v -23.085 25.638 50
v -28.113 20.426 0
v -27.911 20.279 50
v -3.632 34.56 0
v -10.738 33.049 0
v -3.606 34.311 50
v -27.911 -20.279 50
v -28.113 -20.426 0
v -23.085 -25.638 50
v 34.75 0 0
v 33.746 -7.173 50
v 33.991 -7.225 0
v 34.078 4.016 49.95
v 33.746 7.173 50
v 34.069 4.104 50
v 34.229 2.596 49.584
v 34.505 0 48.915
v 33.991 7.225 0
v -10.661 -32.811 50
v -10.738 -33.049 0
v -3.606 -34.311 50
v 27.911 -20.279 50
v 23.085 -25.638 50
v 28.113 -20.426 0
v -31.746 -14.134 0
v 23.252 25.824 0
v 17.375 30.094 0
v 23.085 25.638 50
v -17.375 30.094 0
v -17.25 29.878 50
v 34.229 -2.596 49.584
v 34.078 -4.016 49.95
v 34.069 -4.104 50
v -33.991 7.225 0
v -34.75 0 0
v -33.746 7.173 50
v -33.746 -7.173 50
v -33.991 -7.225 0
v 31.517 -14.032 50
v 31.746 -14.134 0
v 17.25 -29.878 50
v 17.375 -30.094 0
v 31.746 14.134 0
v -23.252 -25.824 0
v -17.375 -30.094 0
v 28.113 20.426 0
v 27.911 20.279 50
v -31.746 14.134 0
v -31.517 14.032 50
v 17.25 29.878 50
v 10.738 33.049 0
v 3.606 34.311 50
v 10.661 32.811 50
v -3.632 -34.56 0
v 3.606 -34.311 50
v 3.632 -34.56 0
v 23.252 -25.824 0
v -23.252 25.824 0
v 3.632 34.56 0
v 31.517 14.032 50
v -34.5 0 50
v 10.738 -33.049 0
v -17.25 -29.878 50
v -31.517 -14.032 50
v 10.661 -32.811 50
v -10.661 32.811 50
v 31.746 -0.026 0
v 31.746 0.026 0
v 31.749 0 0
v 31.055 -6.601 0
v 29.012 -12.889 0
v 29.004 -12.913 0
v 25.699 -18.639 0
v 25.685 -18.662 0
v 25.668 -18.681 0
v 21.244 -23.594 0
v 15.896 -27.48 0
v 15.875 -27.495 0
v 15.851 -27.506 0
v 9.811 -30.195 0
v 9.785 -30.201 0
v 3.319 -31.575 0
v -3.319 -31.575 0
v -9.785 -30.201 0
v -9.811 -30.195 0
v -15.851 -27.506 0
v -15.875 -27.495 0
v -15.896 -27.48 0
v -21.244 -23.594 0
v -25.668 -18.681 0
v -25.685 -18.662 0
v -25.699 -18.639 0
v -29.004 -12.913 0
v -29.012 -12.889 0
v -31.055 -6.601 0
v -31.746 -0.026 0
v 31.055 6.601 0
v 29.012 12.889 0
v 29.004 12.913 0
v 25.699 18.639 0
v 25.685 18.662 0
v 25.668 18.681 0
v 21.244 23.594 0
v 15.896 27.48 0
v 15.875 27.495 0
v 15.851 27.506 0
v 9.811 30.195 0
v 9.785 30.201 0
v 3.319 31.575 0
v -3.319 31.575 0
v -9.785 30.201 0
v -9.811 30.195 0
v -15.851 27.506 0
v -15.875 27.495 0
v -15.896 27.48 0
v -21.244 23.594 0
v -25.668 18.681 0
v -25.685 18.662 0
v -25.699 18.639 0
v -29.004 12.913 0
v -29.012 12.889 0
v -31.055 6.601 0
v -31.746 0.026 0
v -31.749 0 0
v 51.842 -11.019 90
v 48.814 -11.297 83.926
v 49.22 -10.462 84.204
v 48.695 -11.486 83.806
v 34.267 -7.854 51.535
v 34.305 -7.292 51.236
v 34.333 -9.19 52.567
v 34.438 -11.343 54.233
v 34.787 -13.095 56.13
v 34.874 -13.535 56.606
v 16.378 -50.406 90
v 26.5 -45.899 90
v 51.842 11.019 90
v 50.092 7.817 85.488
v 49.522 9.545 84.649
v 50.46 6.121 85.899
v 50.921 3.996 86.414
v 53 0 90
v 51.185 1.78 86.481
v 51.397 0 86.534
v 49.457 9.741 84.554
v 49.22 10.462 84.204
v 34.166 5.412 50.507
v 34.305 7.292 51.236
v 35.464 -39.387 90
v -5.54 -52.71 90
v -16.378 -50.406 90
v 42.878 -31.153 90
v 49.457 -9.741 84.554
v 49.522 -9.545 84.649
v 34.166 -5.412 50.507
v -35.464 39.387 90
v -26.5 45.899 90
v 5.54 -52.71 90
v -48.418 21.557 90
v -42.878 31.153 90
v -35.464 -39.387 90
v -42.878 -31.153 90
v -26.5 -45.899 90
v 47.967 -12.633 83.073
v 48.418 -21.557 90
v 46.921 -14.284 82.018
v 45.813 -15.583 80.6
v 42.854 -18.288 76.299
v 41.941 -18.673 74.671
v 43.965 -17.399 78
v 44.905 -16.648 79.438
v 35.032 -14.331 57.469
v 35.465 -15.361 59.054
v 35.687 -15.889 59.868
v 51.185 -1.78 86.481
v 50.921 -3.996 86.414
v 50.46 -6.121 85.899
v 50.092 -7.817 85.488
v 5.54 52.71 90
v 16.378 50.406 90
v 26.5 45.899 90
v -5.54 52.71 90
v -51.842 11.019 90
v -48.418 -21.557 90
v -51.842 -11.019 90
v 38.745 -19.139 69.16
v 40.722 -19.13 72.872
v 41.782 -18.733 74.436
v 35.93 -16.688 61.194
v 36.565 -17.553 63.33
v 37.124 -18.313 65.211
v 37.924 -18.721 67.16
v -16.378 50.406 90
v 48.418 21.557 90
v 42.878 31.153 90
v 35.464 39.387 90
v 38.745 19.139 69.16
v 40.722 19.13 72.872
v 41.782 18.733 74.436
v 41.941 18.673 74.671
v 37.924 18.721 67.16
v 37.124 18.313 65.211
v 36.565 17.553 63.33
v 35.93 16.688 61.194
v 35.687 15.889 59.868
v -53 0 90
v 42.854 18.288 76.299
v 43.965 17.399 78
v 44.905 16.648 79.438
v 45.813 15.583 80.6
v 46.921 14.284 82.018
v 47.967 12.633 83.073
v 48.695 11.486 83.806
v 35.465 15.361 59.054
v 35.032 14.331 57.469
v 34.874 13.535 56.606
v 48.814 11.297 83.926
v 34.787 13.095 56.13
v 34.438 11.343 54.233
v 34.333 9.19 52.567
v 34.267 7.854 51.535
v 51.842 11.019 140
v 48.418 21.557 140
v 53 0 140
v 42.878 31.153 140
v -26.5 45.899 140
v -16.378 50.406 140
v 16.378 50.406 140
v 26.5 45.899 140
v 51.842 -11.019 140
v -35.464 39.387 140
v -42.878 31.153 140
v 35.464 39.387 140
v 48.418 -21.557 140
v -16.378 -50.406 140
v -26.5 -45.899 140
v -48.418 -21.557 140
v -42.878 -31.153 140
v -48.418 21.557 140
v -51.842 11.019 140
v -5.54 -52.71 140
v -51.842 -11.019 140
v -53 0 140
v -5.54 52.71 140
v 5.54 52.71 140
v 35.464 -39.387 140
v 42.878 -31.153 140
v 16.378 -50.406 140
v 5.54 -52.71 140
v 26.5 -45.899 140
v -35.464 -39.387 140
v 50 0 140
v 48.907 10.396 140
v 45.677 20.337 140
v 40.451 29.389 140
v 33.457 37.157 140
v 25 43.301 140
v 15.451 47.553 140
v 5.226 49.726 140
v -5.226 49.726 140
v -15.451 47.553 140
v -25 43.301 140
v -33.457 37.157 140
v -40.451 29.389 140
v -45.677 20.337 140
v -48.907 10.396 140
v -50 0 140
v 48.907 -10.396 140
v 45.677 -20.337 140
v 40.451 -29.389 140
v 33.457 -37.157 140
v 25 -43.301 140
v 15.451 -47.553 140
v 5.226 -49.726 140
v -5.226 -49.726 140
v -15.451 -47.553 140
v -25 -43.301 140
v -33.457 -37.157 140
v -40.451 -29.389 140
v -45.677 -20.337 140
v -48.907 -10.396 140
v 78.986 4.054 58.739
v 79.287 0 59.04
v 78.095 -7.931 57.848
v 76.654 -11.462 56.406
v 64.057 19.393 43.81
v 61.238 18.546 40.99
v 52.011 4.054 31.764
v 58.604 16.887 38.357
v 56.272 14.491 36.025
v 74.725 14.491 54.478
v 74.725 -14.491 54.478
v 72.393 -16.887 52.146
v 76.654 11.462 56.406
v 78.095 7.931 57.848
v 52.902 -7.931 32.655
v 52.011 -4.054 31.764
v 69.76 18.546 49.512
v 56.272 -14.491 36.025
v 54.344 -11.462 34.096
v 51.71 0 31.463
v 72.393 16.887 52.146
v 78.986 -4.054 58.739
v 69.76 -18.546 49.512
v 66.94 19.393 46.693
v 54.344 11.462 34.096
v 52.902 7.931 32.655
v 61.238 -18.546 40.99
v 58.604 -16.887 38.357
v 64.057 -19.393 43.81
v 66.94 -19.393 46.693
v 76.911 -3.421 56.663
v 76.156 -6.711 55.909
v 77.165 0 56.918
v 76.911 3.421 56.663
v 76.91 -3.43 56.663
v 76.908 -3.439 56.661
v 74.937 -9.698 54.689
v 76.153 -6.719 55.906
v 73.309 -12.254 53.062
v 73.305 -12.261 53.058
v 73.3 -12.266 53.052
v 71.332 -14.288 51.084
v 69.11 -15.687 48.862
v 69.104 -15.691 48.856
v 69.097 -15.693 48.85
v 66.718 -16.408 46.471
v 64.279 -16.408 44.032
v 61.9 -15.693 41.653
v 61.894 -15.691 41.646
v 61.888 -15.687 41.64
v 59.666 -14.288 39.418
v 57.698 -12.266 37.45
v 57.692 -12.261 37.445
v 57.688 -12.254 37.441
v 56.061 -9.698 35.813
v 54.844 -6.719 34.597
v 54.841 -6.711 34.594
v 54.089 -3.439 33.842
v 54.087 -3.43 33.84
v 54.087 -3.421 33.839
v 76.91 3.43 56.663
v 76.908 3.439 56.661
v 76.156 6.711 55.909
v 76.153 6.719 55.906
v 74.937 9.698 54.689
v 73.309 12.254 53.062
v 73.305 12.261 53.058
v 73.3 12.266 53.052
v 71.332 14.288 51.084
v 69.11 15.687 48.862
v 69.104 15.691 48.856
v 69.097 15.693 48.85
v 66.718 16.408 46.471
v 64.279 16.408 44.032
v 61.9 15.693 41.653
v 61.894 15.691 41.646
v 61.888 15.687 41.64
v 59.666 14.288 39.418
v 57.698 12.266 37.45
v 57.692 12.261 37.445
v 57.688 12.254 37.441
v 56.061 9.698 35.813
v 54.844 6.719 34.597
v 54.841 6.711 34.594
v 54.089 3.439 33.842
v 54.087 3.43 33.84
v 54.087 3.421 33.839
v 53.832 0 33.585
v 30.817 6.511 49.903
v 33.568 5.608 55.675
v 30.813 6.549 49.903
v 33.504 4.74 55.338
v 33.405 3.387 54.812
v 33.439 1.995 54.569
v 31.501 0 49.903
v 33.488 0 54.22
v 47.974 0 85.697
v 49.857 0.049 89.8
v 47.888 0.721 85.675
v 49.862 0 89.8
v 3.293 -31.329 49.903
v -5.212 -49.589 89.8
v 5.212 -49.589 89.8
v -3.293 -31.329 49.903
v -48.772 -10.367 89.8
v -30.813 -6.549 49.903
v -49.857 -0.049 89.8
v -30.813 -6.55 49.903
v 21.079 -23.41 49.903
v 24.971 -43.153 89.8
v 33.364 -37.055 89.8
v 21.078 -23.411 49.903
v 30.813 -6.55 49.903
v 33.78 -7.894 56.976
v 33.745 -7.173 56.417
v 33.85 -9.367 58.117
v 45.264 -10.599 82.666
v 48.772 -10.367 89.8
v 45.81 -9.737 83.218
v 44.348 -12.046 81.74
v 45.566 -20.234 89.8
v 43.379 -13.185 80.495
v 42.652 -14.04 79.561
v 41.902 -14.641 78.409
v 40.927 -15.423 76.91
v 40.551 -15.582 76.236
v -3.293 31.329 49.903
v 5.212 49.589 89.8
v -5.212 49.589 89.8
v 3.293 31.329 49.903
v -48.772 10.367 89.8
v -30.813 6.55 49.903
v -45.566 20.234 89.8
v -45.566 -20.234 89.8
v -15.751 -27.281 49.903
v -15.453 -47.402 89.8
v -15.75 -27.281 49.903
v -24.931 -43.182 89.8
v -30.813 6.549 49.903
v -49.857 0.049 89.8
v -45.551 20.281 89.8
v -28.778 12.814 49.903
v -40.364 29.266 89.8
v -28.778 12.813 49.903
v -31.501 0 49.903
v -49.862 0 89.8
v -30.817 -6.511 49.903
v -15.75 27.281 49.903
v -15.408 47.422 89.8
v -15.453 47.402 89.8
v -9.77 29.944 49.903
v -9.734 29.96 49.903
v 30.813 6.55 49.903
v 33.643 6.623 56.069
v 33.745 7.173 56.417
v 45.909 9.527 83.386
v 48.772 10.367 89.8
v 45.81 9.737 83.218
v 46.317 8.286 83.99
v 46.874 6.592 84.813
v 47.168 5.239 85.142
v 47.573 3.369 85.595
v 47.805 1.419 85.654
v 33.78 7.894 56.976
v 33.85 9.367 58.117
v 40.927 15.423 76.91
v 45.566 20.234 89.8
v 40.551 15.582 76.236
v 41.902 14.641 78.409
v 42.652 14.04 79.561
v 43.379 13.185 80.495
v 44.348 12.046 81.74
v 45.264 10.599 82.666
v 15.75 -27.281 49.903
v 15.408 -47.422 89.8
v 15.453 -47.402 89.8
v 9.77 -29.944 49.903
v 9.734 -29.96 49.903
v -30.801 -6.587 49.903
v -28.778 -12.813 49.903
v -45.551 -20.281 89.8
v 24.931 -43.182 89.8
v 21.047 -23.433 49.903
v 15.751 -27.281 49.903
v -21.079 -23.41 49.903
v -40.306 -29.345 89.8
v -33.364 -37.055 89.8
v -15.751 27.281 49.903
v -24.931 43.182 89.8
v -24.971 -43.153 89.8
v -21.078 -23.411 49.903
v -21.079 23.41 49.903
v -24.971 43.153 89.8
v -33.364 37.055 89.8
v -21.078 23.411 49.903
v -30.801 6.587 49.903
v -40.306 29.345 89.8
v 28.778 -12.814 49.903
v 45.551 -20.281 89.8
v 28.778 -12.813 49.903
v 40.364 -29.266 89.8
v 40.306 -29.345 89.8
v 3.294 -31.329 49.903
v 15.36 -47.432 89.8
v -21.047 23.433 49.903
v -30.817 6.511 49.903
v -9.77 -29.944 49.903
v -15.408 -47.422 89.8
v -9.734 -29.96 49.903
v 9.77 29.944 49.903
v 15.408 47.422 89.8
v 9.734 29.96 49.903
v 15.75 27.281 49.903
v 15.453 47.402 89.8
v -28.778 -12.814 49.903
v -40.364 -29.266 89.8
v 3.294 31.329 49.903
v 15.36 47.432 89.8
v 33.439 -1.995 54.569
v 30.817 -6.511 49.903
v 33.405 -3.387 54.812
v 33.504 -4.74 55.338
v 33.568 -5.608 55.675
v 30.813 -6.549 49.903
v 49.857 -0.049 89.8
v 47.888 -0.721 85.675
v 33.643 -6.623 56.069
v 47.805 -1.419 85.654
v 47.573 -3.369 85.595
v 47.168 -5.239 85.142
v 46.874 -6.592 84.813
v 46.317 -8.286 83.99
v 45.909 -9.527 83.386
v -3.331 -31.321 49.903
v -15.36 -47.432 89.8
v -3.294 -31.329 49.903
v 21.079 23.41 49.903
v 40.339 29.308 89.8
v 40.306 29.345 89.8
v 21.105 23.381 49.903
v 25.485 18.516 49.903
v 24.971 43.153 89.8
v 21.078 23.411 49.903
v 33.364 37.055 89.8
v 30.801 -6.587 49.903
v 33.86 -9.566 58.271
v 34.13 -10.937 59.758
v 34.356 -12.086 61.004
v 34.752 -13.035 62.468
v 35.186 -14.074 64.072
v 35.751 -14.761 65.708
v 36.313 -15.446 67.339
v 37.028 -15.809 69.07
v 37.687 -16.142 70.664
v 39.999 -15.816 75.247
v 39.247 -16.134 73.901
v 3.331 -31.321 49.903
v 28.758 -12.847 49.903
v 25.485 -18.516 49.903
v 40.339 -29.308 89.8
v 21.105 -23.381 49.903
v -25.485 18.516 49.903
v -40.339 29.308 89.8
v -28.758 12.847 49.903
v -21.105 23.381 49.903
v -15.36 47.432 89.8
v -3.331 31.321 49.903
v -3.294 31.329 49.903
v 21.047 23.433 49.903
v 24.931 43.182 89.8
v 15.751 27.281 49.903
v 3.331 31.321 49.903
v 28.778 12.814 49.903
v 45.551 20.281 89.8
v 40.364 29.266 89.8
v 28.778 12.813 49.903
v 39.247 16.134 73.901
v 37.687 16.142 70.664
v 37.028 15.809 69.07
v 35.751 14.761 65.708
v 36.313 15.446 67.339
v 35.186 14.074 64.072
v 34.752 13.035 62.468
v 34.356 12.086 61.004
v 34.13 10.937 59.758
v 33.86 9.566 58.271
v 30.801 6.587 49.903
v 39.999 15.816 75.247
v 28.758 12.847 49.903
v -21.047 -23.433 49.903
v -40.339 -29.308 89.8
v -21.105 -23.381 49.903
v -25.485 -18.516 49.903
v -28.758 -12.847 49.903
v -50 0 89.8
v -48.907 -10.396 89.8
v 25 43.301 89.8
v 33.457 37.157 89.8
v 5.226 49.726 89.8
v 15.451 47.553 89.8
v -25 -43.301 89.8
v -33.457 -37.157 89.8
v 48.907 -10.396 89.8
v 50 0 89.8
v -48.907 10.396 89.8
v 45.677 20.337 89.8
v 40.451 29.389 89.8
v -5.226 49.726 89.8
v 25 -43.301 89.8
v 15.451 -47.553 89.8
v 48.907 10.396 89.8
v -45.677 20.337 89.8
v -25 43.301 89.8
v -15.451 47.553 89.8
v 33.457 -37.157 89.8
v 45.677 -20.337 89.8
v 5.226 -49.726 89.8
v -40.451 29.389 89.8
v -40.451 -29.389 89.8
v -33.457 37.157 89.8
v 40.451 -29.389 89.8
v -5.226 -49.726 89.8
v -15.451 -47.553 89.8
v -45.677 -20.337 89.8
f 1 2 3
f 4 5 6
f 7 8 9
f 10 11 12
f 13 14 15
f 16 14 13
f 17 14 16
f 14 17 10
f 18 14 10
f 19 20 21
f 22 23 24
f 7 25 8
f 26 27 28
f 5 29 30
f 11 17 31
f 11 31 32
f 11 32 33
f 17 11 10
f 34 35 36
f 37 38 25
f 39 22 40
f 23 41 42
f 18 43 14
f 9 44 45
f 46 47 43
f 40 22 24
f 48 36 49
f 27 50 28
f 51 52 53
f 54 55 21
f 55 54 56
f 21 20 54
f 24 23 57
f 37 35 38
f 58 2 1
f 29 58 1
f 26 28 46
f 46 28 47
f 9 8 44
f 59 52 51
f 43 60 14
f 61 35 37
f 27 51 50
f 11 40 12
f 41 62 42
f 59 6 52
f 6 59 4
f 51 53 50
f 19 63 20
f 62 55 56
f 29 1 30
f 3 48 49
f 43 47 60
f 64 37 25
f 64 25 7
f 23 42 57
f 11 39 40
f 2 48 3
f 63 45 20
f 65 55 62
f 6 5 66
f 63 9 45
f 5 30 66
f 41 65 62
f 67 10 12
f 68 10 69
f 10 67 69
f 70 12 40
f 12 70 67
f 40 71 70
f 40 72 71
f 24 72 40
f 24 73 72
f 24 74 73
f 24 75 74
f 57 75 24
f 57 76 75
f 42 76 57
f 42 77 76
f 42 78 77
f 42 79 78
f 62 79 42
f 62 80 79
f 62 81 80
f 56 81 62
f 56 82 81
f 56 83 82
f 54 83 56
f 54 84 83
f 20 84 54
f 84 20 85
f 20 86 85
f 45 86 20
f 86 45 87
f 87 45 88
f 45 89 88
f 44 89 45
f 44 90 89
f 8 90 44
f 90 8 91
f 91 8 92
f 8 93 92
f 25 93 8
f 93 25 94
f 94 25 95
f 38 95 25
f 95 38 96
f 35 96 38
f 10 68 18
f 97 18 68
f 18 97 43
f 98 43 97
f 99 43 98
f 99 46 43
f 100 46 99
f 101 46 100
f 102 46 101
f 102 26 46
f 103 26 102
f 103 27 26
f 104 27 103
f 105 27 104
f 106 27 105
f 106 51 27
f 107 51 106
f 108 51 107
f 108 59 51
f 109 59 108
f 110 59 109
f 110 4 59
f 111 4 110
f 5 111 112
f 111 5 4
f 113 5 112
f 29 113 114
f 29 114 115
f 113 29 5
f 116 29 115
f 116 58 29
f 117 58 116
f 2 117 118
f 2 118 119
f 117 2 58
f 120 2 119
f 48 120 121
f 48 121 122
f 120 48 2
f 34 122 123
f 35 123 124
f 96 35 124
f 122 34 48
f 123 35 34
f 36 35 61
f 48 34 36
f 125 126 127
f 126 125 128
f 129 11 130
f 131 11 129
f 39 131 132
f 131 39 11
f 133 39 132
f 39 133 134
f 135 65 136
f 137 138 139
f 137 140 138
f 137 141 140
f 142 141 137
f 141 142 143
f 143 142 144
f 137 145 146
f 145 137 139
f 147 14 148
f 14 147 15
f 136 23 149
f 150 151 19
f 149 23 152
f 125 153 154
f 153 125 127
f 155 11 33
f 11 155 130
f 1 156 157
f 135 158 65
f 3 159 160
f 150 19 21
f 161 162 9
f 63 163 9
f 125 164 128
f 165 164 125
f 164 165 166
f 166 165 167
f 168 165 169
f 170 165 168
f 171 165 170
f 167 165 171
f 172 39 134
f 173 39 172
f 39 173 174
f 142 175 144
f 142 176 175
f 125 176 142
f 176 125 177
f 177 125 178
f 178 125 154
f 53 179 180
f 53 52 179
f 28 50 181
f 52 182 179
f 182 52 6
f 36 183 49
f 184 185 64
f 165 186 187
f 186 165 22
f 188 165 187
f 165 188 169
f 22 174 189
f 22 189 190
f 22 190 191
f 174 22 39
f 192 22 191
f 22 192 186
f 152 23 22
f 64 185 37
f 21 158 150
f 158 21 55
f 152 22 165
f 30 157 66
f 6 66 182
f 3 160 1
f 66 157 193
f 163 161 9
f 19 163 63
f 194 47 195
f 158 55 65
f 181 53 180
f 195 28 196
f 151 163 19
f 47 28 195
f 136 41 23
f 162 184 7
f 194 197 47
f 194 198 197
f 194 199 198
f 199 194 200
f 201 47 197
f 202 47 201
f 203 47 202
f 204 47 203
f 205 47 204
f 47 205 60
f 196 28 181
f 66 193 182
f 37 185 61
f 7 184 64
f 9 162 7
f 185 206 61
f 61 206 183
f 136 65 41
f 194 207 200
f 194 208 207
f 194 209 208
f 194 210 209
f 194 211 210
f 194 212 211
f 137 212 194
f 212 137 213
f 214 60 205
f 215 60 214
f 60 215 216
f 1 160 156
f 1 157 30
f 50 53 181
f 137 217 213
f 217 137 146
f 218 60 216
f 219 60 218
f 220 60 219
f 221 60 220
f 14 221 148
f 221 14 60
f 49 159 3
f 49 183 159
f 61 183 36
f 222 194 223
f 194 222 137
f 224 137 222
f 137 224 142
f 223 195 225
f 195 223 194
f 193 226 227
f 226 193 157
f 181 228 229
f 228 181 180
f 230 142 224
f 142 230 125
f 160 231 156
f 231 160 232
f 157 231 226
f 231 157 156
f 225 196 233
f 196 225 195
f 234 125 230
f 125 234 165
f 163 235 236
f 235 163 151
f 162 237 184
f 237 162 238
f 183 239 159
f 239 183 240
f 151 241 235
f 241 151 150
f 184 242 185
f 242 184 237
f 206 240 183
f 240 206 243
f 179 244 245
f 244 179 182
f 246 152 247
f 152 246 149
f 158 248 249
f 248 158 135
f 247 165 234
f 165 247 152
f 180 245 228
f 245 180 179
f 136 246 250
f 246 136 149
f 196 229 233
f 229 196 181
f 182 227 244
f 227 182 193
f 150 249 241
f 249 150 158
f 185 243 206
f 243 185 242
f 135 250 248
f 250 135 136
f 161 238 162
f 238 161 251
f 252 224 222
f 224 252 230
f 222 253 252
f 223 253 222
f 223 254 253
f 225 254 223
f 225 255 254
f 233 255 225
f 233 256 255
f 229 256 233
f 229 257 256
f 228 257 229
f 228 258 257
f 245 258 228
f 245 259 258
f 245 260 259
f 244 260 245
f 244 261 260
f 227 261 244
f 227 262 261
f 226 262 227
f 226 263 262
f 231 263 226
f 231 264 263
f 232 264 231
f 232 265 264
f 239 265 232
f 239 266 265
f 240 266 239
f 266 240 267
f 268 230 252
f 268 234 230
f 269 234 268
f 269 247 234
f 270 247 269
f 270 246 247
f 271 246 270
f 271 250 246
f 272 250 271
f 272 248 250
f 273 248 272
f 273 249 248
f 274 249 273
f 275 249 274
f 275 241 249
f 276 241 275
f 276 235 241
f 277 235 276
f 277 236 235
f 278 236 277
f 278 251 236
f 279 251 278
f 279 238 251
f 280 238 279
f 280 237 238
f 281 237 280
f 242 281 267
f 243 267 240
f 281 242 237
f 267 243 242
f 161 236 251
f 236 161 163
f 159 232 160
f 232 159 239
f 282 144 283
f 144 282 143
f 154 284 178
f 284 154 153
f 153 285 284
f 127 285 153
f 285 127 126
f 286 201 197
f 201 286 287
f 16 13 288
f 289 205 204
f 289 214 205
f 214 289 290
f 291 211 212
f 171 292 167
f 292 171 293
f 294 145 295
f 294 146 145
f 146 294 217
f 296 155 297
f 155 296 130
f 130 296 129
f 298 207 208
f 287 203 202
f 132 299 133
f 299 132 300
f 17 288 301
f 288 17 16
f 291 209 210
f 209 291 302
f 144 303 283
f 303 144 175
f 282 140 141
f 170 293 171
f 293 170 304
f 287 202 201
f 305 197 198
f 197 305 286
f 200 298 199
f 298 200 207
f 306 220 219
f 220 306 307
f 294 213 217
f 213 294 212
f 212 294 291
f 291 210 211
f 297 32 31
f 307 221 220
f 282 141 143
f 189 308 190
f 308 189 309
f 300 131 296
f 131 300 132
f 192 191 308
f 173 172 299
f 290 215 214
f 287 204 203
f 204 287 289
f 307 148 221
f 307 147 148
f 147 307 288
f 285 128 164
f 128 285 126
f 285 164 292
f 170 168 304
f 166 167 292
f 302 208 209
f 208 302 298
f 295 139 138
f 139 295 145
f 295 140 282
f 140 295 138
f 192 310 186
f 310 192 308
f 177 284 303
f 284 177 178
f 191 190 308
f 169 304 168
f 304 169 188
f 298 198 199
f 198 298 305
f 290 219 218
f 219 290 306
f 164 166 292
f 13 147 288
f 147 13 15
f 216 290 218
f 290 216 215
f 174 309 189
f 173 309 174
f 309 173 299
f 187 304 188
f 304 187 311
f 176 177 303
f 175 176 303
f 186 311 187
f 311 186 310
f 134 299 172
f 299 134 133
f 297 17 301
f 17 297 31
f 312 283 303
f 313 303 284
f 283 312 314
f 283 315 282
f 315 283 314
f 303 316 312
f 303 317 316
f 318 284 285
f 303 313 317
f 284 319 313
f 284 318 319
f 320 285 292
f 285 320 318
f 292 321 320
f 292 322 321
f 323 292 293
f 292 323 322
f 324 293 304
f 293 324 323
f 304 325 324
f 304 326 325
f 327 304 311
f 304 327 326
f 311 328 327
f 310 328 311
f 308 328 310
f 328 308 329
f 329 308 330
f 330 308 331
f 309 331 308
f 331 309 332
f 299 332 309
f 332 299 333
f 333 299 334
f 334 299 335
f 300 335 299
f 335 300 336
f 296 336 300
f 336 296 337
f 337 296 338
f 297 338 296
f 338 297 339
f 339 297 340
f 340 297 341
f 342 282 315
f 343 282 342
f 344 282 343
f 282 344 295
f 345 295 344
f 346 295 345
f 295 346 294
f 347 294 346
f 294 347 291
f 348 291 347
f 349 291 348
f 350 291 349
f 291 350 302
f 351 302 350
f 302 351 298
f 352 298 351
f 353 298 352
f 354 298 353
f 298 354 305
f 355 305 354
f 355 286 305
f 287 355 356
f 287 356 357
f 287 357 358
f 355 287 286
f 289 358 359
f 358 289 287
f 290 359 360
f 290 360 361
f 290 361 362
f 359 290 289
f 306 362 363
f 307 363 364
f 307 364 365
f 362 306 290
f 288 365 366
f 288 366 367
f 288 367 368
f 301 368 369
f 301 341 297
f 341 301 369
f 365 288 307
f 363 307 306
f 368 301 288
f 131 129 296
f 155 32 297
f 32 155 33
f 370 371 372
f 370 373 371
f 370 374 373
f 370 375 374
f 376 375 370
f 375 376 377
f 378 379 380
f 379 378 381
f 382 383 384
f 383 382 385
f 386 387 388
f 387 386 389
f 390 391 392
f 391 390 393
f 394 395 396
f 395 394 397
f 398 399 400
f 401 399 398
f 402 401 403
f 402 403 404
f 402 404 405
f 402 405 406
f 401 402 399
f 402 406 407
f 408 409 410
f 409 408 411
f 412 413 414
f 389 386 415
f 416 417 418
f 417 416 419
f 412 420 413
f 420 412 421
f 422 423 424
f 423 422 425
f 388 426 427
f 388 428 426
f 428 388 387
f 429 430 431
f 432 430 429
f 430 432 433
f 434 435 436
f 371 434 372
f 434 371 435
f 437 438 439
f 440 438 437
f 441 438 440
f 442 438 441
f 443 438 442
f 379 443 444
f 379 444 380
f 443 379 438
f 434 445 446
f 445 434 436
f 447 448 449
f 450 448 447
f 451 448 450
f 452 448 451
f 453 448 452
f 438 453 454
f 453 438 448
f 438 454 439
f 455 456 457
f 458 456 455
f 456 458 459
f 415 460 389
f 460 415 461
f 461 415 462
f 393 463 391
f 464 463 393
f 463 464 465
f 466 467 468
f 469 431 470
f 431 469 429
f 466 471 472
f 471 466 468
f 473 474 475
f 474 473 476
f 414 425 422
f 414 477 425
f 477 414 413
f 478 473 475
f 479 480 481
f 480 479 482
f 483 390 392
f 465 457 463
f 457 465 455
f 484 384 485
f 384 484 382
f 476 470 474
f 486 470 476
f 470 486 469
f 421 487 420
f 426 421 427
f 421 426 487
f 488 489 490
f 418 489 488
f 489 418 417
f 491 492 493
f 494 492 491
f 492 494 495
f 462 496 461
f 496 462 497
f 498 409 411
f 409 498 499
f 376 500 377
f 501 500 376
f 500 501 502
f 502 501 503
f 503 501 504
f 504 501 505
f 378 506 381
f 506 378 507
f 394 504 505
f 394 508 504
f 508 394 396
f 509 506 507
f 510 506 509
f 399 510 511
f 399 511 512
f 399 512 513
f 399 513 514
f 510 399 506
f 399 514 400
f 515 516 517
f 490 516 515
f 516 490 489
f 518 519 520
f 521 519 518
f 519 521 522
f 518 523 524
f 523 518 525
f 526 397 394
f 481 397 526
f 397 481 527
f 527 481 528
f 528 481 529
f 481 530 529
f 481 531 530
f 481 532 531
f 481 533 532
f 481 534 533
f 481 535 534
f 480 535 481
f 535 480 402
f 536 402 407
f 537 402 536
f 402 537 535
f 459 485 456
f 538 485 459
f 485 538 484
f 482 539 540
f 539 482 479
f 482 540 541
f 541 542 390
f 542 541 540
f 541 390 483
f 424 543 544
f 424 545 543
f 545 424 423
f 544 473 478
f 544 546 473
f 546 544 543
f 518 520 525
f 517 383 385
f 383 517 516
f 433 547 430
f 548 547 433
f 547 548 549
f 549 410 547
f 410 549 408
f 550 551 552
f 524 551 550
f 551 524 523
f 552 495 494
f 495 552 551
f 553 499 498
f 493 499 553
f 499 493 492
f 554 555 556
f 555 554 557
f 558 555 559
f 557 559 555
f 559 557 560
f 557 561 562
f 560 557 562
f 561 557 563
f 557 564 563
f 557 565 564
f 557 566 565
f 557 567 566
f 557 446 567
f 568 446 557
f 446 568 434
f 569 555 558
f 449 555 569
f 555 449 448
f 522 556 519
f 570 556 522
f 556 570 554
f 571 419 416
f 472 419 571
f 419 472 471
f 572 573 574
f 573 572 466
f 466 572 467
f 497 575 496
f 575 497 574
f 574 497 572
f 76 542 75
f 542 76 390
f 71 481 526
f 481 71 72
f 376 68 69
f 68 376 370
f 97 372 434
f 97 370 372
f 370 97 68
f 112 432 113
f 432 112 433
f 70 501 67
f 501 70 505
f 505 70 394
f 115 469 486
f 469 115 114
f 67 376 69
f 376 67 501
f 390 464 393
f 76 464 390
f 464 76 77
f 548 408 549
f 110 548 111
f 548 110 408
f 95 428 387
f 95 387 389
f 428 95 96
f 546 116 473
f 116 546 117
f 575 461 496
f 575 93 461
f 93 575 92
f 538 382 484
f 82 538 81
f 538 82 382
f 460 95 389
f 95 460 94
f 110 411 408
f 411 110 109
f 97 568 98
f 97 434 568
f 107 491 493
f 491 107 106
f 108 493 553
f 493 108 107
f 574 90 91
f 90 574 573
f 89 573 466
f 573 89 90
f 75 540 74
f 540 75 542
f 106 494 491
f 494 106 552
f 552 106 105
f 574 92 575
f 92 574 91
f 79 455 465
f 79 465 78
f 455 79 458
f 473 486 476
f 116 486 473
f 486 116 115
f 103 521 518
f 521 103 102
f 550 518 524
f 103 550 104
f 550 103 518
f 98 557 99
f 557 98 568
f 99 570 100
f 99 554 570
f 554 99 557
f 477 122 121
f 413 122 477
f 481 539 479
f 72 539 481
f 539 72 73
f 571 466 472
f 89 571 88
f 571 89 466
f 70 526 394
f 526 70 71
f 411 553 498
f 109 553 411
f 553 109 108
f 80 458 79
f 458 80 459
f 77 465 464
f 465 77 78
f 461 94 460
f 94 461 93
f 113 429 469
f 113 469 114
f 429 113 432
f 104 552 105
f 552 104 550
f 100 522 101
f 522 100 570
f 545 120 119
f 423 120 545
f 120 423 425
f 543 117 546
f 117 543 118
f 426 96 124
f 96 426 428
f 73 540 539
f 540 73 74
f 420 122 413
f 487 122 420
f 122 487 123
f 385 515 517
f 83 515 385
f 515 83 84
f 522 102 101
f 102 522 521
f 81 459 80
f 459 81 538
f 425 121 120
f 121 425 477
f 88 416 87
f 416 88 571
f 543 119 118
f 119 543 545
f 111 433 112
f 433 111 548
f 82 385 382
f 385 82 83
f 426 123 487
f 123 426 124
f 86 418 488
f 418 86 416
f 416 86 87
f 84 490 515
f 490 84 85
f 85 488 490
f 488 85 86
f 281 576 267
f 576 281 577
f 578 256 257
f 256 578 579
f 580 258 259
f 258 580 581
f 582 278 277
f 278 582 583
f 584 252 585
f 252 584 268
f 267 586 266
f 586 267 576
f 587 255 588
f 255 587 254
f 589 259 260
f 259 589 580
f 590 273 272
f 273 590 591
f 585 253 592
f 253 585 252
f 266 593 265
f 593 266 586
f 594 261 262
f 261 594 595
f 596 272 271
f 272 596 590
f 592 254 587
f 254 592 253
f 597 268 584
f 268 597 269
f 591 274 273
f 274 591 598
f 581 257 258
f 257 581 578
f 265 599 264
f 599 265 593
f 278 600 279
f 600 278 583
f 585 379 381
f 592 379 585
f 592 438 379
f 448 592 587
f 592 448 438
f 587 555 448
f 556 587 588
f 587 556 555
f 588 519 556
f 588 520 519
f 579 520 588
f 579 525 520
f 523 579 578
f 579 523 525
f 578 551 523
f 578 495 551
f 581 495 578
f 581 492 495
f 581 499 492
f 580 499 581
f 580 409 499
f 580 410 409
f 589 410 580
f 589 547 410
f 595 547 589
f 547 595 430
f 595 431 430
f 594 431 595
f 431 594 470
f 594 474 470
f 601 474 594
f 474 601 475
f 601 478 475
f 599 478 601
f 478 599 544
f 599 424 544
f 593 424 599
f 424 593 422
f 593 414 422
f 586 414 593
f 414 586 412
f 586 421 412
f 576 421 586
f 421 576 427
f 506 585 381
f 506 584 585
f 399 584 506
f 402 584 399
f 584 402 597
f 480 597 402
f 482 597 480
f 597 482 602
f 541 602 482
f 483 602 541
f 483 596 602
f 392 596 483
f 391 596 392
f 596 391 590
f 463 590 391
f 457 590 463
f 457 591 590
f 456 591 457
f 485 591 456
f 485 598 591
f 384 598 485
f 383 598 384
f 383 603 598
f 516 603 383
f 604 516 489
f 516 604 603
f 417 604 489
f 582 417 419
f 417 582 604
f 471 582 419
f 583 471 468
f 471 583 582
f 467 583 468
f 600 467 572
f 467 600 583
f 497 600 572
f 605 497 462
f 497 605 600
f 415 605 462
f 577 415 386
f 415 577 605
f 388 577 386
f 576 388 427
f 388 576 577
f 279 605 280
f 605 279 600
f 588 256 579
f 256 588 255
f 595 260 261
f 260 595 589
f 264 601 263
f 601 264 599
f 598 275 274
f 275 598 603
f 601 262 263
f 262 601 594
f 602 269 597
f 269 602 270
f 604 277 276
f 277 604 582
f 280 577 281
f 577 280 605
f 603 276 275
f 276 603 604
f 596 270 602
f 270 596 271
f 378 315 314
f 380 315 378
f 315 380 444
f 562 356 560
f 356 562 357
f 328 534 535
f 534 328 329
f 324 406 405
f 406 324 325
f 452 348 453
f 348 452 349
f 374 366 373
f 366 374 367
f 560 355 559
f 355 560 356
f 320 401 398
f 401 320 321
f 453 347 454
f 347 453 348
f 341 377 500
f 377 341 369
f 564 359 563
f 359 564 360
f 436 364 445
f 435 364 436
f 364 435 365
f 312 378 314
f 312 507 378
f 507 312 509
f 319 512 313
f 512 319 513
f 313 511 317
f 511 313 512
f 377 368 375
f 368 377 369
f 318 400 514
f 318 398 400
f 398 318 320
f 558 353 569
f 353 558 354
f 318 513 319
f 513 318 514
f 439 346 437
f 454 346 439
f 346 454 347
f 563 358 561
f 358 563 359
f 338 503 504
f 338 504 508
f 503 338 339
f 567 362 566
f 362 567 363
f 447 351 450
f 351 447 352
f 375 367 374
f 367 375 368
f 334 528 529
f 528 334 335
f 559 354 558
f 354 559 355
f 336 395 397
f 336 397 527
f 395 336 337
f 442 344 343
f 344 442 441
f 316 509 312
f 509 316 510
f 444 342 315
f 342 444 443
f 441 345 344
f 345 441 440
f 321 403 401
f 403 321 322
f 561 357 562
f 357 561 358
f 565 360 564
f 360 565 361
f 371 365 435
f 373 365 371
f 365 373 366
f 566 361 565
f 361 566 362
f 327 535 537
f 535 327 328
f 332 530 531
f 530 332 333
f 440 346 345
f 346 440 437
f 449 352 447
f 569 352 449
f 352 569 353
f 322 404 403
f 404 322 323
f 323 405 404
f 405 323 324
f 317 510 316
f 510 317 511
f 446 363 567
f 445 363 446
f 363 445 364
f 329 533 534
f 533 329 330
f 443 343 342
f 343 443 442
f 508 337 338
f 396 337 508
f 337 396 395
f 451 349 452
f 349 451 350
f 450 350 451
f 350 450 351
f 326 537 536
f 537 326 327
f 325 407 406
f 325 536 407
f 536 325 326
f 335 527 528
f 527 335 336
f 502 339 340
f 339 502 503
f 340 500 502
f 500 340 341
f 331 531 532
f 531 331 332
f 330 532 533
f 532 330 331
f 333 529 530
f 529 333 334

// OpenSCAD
// Parametric Dust Hose Adapter with Tapered Fittings 🛠️
// Creates a dust hose adapter with tapered sections and conical transition
// 吕 minimaple 

// ===== PARAMETERS =====

// Top section parameters
// Diameter at the tip of top section
top_taper_diameter_tip = 63.5;     
// Diameter at the base of top section
top_taper_diameter_base = 63;     
// Length of top section
top_length = 50;                 
// Set to true if this is an outer fitting, false for inner fitting. If outer fitting then diameter is inner diameter + taper inside (reducing). Otherwise diameter is outer diameter + taper outside (increasing)
top_is_outer_fitting = true;    
// Wall thickness for top section
top_wall_thickness = 3;          

// Bottom section parameters
// Diameter at the tip of bottom section (connects to mid section)
bot_taper_diameter_tip = 106;     
// Diameter at the base of bottom section (free end)
bot_taper_diameter_base = 106;     
// Length of bottom section
bot_length = 50;                 
// Set to true if this is an outer fitting, false for inner fitting
bot_is_outer_fitting = false;    
// Wall thickness for bottom section
bot_wall_thickness = 3;          

// Length of conical mid section connecting top and bottom sections
mid_length = 40;                 

// Side port parameters
// Diameter at the tip of side port
side_taper_diameter_tip = 38;    
// Diameter at the base of side port
side_taper_diameter_base = 39;   
// Length of side port, make this a little longer than you need as part of it is sticking into the mid section
side_length = 70;                
// Angle at which side port sticks out (degrees)
side_angle = -45;                 
// Set to true if this is an outer fitting, false for inner fitting
side_is_outer_fitting = false; 
// Wall thickness for side port
side_wall_thickness = 3;         

// Account for OpenSCAD Z fighting issues, do not change
poop = 0.1;                     

// ===== HELPER FUNCTIONS =====

// Generate the additive geometry (outer shell) for tapered cylinder
module tapered_cylinder_additive(length, diameter_A, diameter_B, wall_thickness, is_outer_fitting) {
    if (is_outer_fitting) {
        // Diameters are inside diameters, so add wall thickness for outer shell
        cylinder(h = length, d1 = diameter_A + 2*wall_thickness, d2 = diameter_B + 2*wall_thickness, center = false);
    } else {
        // Diameters are outside diameters, so use as-is for outer shell
        cylinder(h = length, d1 = diameter_A, d2 = diameter_B, center = false);
    }
}

// Generate the subtractive geometry (inner bore) for tapered cylinder
module tapered_cylinder_subtractive(length, diameter_A, diameter_B, wall_thickness, is_outer_fitting) {
    if (is_outer_fitting) {
        // Diameters are inside diameters, so use as-is for inner bore
        translate([0, 0, -poop]) {
            cylinder(h = length + poop*2, d1 = diameter_A, d2 = diameter_B, center = false);
        }
    } else {
        // Diameters are outside diameters, so subtract wall thickness for inner bore
        translate([0, 0, -poop]) {
            cylinder(h = length + poop*2, d1 = diameter_A - 2*wall_thickness, d2 = diameter_B - 2*wall_thickness, center = false);
        }
    }
}

// Generate a tapered cylinder with specified parameters
module tapered_cylinder(length, diameter_A, diameter_B, wall_thickness, is_outer_fitting) {
    difference() {
        tapered_cylinder_additive(length, diameter_A, diameter_B, wall_thickness, is_outer_fitting);
        tapered_cylinder_subtractive(length, diameter_A, diameter_B, wall_thickness, is_outer_fitting);
    }
}

// ===== DUST HOSE ADAPTER =====

module dust_hose_adapter() {
    // Assertions to ensure proper diameter ordering for each section
    if (top_is_outer_fitting) {
        assert(top_taper_diameter_tip >= top_taper_diameter_base, "Top section: For inside fitting, tip diameter must be larger than base diameter");
    } else {
        assert(top_taper_diameter_tip <= top_taper_diameter_base, "Top section: For outside fitting, tip diameter must be smaller than base diameter");
    }
    
    if (bot_is_outer_fitting) {
        assert(bot_taper_diameter_tip >= bot_taper_diameter_base, "Bottom section: For inside fitting, tip diameter must be larger than base diameter");
    } else {
        assert(bot_taper_diameter_tip <= bot_taper_diameter_base, "Bottom section: For outside fitting, tip diameter must be smaller than base diameter");
    }
    
    if (side_is_outer_fitting) {
        assert(side_taper_diameter_tip >= side_taper_diameter_base, "Side section: For inside fitting, tip diameter must be larger than base diameter");
    } else {
        assert(side_taper_diameter_tip <= side_taper_diameter_base, "Side section: For outside fitting, tip diameter must be smaller than base diameter");
    }

    top_base_outer_diameter = top_is_outer_fitting ? top_taper_diameter_base + 2*top_wall_thickness : top_taper_diameter_base;
    bot_base_outer_diameter = bot_is_outer_fitting ? bot_taper_diameter_base + 2*bot_wall_thickness : bot_taper_diameter_base;

    top_base_inner_diameter = top_is_outer_fitting ? top_taper_diameter_base : top_taper_diameter_base - 2*top_wall_thickness;
    bot_base_inner_diameter = bot_is_outer_fitting ? bot_taper_diameter_base : bot_taper_diameter_base - 2*bot_wall_thickness;
    
    difference() {
        union() {
            // Top tapered section (additive part only)
            translate([0, 0, 0]) {
                tapered_cylinder_additive(
                    top_length, 
                    top_taper_diameter_tip, 
                    top_taper_diameter_base, 
                    top_wall_thickness, 
                    top_is_outer_fitting
                );
            }
            
            // Conical mid section
            translate([0, 0, top_length]) {
                cylinder(h = mid_length, d1 = top_base_outer_diameter, d2 = bot_base_outer_diameter, center = false);
            }
            
            // Bottom tapered section (additive part only)
            translate([0, 0, top_length + mid_length]) {
                tapered_cylinder_additive(
                    bot_length, 
                    bot_taper_diameter_base, 
                    bot_taper_diameter_tip, 
                    bot_wall_thickness, 
                    bot_is_outer_fitting
                );
            }
            
            // Side port tapered section (additive part only)
            translate([(top_base_inner_diameter + bot_base_inner_diameter)/4, 0, top_length + mid_length/2]) {
                rotate([0, side_angle, 0]) {
                    translate([0, 0, -side_length/2]) {
                        tapered_cylinder_additive(
                            side_length, 
                            side_taper_diameter_base,
                            side_taper_diameter_tip, 
                            side_wall_thickness, 
                            side_is_outer_fitting
                        );
                    }
                }
            }
        }
        
        // Cut out inner passages for mid section connections
        // Top to mid connection
        translate([0, 0, top_length - poop]) {
            cylinder(h = mid_length + 2*poop, d1 = top_base_inner_diameter, d2 = bot_base_inner_diameter, center = false);
        }
        
        // Top section subtractive part
        translate([0, 0, -poop]) {
            tapered_cylinder_subtractive(
                top_length + poop*2, 
                top_taper_diameter_tip, 
                top_taper_diameter_base, 
                top_wall_thickness, 
                top_is_outer_fitting
            );
        }
        
        // Bottom section subtractive part
        translate([0, 0, top_length + mid_length - poop]) {
            tapered_cylinder_subtractive(
                bot_length + poop*2, 
                bot_taper_diameter_base, 
                bot_taper_diameter_tip, 
                bot_wall_thickness, 
                bot_is_outer_fitting
            );
        }
        
        // Side port subtractive part (only the portion that would be inside the adapter)
        translate([(top_base_inner_diameter + bot_base_inner_diameter)/4, 0, top_length + mid_length/2]) {
            rotate([0, side_angle, 0]) {
                translate([0, 0, -side_length/2 - poop]) {
                    tapered_cylinder_subtractive(
                        side_length + poop*2, 
                        side_taper_diameter_base,
                        side_taper_diameter_tip, 
                        side_wall_thickness, 
                        side_is_outer_fitting
                    );
                }
            }
        }
    }
}

dust_hose_adapter(); 
